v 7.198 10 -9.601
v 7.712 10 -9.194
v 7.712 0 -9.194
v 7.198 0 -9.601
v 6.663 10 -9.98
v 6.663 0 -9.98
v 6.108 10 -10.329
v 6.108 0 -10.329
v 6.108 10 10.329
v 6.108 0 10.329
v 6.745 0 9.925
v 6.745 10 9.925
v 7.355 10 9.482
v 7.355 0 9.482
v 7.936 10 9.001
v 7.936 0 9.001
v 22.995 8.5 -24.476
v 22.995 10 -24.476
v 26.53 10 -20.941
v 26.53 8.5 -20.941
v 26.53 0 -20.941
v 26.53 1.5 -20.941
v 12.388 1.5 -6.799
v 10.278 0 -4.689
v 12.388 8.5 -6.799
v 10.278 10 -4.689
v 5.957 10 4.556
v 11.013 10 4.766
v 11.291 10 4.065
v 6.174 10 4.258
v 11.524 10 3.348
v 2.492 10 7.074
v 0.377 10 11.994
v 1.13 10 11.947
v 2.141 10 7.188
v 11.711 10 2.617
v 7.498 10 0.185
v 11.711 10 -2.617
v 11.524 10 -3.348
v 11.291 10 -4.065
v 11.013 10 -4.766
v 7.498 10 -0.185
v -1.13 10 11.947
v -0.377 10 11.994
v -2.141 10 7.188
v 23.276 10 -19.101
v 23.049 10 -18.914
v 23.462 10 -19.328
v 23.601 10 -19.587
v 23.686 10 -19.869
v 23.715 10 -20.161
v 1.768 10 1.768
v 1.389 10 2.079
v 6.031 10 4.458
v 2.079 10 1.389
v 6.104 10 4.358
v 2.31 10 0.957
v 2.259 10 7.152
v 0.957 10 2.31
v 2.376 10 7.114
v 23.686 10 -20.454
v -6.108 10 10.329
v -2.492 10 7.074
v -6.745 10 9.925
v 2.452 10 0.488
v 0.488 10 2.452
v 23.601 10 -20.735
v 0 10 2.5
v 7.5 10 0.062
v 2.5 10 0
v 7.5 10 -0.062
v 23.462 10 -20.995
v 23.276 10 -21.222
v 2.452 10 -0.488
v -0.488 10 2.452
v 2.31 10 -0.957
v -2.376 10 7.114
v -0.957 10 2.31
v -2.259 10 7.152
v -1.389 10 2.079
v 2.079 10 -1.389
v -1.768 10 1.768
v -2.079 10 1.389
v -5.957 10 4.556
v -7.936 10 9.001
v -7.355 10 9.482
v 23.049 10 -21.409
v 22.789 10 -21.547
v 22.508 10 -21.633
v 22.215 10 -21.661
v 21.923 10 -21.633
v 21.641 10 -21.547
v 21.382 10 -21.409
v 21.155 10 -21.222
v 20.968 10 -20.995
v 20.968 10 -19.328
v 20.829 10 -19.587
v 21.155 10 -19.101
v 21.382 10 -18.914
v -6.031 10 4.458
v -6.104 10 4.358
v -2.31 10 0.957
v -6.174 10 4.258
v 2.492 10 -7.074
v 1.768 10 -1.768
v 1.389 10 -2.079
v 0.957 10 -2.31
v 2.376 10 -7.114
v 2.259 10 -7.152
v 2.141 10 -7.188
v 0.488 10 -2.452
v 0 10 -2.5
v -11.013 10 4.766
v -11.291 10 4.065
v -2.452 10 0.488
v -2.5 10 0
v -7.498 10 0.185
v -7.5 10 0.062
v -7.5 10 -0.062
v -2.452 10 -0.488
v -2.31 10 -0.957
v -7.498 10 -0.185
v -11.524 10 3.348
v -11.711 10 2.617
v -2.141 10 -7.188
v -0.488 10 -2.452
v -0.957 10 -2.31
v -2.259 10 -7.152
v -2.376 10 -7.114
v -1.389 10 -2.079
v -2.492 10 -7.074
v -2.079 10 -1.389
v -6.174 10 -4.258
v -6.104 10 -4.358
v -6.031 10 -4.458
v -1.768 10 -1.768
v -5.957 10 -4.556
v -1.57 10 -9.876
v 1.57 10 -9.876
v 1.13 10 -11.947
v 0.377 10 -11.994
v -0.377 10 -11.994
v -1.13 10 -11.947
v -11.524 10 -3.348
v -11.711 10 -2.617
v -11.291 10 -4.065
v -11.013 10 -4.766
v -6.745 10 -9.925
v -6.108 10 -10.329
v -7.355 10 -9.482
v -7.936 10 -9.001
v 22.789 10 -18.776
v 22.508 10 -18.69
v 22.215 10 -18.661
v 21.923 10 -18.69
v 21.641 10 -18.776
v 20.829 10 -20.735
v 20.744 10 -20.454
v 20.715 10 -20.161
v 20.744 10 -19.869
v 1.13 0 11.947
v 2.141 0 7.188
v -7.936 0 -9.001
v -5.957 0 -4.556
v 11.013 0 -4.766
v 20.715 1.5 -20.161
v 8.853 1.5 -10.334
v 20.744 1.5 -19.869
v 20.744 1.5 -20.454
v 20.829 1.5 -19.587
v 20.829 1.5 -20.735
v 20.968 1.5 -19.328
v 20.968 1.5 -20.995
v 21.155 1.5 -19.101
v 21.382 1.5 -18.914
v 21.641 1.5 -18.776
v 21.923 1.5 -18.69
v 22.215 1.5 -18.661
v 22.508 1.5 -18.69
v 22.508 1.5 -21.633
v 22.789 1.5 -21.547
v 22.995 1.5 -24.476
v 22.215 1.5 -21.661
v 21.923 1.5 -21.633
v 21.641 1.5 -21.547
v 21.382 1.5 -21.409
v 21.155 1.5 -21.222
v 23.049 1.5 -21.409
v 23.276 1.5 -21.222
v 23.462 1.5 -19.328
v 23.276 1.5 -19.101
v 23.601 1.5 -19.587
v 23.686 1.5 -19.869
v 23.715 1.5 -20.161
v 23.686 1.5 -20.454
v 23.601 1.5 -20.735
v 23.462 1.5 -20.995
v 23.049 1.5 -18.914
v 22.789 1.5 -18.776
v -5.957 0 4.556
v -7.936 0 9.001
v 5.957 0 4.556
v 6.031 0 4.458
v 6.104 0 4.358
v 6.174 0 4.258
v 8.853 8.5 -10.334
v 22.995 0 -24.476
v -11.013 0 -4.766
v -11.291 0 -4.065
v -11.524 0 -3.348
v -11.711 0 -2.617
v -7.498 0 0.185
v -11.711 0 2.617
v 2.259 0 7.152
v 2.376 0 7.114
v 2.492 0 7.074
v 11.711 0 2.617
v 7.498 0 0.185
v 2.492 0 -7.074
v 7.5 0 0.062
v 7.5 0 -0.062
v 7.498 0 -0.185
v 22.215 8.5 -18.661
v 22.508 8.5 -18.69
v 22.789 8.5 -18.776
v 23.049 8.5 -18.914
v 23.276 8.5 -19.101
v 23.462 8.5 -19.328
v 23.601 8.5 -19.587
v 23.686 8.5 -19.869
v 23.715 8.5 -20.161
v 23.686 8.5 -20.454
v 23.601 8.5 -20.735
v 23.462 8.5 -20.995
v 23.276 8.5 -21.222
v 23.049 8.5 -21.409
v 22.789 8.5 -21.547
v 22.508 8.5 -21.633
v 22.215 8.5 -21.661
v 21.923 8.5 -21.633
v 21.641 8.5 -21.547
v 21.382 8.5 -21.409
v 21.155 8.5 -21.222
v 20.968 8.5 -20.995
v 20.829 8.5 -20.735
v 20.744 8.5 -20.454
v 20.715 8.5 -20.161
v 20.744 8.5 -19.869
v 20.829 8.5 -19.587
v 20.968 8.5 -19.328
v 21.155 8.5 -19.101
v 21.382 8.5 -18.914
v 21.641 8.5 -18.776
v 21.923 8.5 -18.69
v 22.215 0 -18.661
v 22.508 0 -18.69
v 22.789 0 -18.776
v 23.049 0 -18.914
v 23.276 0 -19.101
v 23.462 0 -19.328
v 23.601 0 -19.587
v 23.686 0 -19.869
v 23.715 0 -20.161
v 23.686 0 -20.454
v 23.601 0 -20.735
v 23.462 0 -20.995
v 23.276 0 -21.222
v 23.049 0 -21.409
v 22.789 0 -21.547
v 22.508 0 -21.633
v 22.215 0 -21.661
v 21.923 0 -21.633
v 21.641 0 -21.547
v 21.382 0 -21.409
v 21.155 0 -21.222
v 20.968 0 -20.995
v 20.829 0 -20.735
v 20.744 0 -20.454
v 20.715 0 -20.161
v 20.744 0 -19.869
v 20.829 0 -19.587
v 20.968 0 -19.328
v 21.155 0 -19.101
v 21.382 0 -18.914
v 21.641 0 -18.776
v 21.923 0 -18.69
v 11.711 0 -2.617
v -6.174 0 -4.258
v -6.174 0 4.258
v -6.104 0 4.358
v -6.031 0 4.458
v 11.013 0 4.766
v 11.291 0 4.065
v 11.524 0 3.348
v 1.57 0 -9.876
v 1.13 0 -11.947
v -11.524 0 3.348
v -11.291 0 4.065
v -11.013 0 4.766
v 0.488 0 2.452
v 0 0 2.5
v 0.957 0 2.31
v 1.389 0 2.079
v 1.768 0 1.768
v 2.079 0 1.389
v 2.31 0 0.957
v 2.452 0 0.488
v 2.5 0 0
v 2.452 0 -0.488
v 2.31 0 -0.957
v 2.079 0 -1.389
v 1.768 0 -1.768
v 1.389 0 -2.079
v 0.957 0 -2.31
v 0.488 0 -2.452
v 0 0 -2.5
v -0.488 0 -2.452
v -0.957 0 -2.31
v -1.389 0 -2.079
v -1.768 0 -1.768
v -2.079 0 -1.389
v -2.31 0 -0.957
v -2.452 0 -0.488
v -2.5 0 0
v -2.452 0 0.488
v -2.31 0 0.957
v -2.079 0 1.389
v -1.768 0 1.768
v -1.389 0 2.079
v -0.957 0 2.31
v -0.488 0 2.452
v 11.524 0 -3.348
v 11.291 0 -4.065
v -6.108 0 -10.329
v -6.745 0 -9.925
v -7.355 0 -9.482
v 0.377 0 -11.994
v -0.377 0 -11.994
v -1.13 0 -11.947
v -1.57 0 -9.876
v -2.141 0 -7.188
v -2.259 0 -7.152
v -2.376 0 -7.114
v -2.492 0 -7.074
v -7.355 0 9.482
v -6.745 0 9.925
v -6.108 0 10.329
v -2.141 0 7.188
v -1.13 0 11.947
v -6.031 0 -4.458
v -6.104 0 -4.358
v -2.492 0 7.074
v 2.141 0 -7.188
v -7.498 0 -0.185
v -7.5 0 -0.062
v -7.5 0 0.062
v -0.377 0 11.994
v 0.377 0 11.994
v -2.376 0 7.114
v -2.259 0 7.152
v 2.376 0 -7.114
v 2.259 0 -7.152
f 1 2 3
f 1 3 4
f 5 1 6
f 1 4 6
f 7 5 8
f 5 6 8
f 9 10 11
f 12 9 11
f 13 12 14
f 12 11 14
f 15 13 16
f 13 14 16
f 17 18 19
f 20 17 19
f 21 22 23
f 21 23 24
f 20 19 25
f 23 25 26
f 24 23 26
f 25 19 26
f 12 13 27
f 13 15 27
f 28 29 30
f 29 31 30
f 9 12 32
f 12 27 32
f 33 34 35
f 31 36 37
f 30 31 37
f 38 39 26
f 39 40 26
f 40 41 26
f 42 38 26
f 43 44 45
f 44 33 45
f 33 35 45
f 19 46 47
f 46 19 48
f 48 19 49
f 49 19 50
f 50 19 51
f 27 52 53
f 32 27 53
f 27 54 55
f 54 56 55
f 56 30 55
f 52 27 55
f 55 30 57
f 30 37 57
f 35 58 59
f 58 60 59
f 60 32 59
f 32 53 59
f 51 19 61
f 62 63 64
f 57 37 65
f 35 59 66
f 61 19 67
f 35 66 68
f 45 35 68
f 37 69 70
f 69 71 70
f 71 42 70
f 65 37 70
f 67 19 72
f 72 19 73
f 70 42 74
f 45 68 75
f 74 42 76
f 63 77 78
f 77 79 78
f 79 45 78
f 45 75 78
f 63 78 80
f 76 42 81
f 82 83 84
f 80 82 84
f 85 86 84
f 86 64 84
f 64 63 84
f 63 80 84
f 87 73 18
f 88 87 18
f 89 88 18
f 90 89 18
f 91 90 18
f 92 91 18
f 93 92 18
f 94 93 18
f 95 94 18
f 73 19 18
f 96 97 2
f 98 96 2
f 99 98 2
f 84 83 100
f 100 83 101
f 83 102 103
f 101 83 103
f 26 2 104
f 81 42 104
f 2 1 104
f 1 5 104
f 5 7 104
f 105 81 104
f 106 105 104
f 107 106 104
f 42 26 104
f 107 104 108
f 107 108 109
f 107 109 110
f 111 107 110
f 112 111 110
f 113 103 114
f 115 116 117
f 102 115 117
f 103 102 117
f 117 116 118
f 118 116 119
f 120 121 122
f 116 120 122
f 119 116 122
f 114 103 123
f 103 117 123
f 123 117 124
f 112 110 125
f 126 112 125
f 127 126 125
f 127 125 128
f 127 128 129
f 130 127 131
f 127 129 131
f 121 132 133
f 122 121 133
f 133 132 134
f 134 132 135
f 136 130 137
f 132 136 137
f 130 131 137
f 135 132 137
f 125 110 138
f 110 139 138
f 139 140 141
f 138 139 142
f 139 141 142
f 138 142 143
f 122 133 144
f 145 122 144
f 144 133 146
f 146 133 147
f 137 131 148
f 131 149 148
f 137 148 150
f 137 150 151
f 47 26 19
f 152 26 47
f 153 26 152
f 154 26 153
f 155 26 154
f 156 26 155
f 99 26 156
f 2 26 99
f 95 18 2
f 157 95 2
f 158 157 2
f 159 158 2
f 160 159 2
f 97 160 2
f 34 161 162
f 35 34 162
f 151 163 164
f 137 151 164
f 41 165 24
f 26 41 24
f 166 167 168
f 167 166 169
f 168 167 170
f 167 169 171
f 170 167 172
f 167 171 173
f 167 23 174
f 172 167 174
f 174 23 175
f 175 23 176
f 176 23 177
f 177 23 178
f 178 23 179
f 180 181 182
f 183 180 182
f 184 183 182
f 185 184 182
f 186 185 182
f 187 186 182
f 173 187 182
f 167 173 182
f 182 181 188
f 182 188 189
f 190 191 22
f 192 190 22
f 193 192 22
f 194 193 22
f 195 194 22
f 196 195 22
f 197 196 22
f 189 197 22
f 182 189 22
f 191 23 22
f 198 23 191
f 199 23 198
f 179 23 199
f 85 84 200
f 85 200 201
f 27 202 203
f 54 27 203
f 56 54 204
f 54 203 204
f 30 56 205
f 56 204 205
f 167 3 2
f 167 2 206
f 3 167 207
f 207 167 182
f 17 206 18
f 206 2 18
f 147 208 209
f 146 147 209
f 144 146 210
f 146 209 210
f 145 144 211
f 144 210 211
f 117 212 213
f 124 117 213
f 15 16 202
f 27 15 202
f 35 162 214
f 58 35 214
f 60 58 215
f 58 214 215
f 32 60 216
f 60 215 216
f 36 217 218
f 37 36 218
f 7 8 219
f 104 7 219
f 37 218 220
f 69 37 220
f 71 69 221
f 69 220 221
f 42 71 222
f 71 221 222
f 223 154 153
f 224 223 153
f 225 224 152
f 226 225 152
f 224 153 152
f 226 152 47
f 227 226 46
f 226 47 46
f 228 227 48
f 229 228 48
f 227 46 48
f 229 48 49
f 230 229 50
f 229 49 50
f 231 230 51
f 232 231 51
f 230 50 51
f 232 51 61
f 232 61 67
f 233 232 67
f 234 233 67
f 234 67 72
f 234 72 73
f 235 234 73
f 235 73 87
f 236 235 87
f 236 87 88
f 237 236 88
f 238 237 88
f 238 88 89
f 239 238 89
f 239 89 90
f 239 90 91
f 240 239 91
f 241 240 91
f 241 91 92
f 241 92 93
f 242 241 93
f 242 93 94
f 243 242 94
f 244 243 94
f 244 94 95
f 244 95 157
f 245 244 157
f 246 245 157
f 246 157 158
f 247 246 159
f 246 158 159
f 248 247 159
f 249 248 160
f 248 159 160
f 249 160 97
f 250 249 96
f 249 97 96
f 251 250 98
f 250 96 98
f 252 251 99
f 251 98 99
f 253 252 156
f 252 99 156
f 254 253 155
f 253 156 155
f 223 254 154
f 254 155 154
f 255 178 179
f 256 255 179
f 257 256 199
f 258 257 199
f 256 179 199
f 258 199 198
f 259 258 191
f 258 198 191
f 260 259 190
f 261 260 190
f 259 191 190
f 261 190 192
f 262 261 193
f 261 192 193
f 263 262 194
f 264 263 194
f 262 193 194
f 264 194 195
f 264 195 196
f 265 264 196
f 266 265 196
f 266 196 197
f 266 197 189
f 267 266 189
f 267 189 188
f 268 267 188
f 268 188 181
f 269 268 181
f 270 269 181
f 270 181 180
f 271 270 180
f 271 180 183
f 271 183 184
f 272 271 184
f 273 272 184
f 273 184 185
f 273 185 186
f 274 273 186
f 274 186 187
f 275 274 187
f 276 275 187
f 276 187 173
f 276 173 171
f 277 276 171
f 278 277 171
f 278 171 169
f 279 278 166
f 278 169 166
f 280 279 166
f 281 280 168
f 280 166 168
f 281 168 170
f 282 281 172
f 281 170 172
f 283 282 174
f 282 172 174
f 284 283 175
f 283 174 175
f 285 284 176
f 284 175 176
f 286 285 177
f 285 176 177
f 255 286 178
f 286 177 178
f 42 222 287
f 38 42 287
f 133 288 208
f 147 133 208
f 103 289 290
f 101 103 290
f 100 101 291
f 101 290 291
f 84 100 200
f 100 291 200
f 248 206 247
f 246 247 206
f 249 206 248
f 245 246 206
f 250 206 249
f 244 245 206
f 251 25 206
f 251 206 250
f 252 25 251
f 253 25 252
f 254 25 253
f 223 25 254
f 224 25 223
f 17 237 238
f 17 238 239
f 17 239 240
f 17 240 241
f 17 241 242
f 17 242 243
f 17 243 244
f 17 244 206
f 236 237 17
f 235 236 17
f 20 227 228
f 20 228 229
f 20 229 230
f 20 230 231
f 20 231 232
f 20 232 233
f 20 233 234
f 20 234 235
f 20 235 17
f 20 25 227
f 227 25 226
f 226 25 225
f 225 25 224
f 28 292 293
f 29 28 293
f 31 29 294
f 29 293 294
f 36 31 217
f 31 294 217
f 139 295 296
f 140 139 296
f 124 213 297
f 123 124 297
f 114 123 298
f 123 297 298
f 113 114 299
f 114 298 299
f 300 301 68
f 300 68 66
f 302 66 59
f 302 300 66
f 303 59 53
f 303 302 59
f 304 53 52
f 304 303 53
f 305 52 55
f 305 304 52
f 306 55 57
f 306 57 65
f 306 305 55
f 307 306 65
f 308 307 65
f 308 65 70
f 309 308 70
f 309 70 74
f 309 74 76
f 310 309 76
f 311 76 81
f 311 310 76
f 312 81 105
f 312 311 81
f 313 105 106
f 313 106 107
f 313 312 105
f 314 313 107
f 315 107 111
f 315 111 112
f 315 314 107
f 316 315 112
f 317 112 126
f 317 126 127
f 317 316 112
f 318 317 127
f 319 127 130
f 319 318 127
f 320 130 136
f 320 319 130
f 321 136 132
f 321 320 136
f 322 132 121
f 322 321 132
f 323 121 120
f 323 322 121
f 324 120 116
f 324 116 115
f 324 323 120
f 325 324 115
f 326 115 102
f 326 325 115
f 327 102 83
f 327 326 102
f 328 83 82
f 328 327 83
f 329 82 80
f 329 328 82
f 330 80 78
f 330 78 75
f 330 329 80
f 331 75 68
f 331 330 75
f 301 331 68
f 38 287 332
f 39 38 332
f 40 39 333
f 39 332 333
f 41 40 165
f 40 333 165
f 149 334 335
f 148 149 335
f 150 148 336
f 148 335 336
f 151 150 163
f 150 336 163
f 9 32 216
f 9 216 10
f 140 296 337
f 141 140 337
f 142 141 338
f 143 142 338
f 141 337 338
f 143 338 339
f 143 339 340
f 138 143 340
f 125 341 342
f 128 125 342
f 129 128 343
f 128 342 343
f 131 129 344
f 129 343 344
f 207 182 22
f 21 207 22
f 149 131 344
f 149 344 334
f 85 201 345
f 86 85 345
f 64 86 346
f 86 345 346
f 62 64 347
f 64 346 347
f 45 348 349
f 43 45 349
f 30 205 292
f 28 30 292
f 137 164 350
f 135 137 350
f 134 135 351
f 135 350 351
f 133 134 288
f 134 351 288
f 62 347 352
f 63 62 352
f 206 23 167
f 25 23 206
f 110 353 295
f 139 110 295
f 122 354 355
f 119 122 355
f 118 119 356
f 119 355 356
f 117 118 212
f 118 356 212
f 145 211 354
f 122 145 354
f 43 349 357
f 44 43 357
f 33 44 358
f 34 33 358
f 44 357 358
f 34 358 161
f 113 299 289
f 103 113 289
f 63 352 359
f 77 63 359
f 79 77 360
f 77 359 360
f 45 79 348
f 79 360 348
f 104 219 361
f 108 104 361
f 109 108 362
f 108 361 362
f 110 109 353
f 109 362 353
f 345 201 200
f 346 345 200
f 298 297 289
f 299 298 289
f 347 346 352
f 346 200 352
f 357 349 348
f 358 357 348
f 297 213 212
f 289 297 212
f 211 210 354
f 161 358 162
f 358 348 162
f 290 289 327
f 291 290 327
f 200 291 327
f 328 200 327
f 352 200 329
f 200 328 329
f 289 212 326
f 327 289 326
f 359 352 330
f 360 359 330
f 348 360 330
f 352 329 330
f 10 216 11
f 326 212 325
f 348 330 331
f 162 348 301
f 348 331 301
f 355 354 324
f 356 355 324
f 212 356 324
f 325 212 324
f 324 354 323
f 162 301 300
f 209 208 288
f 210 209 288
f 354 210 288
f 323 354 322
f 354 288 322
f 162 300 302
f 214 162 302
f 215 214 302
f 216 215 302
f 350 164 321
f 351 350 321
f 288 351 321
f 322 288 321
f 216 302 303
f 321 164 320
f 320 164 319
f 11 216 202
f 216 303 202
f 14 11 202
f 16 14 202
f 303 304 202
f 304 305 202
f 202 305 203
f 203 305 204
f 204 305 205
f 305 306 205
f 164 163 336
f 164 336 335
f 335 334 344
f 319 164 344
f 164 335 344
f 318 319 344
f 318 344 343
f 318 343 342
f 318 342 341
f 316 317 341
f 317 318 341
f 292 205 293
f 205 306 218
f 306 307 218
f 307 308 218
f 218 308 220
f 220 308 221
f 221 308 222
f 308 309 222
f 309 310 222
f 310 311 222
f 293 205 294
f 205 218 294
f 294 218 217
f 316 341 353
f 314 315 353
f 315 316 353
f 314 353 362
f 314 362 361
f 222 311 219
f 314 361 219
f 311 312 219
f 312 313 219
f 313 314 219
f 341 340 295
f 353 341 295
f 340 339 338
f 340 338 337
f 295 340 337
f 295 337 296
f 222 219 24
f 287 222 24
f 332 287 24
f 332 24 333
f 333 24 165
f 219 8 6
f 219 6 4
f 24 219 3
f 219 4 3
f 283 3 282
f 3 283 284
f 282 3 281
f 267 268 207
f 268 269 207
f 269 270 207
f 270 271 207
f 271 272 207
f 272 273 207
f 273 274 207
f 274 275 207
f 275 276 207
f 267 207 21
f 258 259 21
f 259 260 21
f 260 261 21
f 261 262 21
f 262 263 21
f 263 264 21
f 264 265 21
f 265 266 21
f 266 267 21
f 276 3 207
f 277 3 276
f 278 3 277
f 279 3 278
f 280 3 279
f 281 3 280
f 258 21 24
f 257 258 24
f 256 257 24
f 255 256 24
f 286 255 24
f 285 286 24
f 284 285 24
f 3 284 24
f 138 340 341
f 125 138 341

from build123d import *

# Parameters (mm, degrees)
SKETCH1_R           = 2.5
BOSS_EXTRUDE1_DEPTH = 10
BOSS_EXTRUDE2_DEPTH = 10
SKETCH3_R           = 1.5
CUT_EXTRUDE1_DEPTH  = 55
SKETCH4_W           = 40
SKETCH4_H           = 7
CUT_EXTRUDE2_DEPTH  = 10


with BuildPart() as part:
    # Sketch1 → Boss-Extrude1 (new body)
    # profile 1 of 2: a face of its own
    with BuildSketch(Plane(origin=(0, 0, 0), x_dir=(1, 0, 0), z_dir=(0, 1, 0))):
        with BuildLine():
            Line((1.57, 9.875986027), (-1.57, 9.875986027))
            Line((-1.57, 9.875986027), (-2.141392001, 7.187798015))
            ThreePointArc((-2.141392001, 7.187798015), (-2.317627458, 7.132923872), (-2.492459149, 7.073729383))
            Line((-2.492459149, 7.073729383), (-6.108014237, 10.329189807))
            ThreePointArc((-6.108014237, 10.329189807), (-7.053423028, 9.708203932), (-7.936163073, 9.000961931))
            Line((-7.936163073, 9.000961931), (-5.95730419, 4.556372108))
            ThreePointArc((-5.95730419, 4.556372108), (-6.067627458, 4.408389392), (-6.17427562, 4.257736555))
            Line((-6.17427562, 4.257736555), (-11.012832757, 4.766289403))
            ThreePointArc((-11.012832757, 4.766289403), (-11.412678196, 3.708203932), (-11.711123476, 2.617171553))
            Line((-11.711123476, 2.617171553), (-7.497728659, 0.184566922))
            ThreePointArc((-7.497728659, 0.184566922), (-7.5, 0), (-7.497728659, -0.184566922))
            Line((-7.497728659, -0.184566922), (-11.711123476, -2.617171553))
            ThreePointArc((-11.711123476, -2.617171553), (-11.412678196, -3.708203932), (-11.012832757, -4.766289403))
            Line((-11.012832757, -4.766289403), (-6.17427562, -4.257736555))
            ThreePointArc((-6.17427562, -4.257736555), (-6.067627458, -4.408389392), (-5.95730419, -4.556372108))
            Line((-5.95730419, -4.556372108), (-7.936163073, -9.000961931))
            ThreePointArc((-7.936163073, -9.000961931), (-7.053423028, -9.708203932), (-6.108014237, -10.329189807))
            Line((-6.108014237, -10.329189807), (-2.492459149, -7.073729383))
            ThreePointArc((-2.492459149, -7.073729383), (-2.317627458, -7.132923872), (-2.141392001, -7.187798015))
            Line((-2.141392001, -7.187798015), (-1.129858117, -11.946690782))
            ThreePointArc((-1.129858117, -11.946690782), (0, -12), (1.129858117, -11.946690782))
            Line((1.129858117, -11.946690782), (2.141392001, -7.187798015))
            ThreePointArc((2.141392001, -7.187798015), (2.317627458, -7.132923872), (2.492459149, -7.073729383))
            Line((2.492459149, -7.073729383), (6.108014237, -10.329189807))
            ThreePointArc((6.108014237, -10.329189807), (7.053423028, -9.708203932), (7.936163073, -9.000961931))
            Line((7.936163073, -9.000961931), (5.95730419, -4.556372108))
            ThreePointArc((5.95730419, -4.556372108), (6.067627458, -4.408389392), (6.17427562, -4.257736555))
            Line((6.17427562, -4.257736555), (11.012832757, -4.766289403))
            ThreePointArc((11.012832757, -4.766289403), (11.412678196, -3.708203932), (11.711123476, -2.617171553))
            Line((11.711123476, -2.617171553), (7.497728659, -0.184566922))
            ThreePointArc((7.497728659, -0.184566922), (7.5, 0), (7.497728659, 0.184566922))
            Line((7.497728659, 0.184566922), (11.711123476, 2.617171553))
            ThreePointArc((11.711123476, 2.617171553), (11.412678196, 3.708203932), (11.012832757, 4.766289403))
            Line((11.012832757, 4.766289403), (6.17427562, 4.257736555))
            ThreePointArc((6.17427562, 4.257736555), (6.067627458, 4.408389392), (5.95730419, 4.556372108))
            Line((5.95730419, 4.556372108), (7.936163073, 9.000961931))
            ThreePointArc((7.936163073, 9.000961931), (7.053423028, 9.708203932), (6.108014237, 10.329189807))
            Line((6.108014237, 10.329189807), (2.492459149, 7.073729383))
            ThreePointArc((2.492459149, 7.073729383), (2.317627458, 7.132923872), (2.141392001, 7.187798015))
            Line((2.141392001, 7.187798015), (1.57, 9.875986027))
        make_face()
        with Locations(Location((0, 0, 0), (0, 0, 270))):
            Circle(SKETCH1_R, mode=Mode.SUBTRACT)
    # profile 2 of 2: a face of its own
    with BuildSketch(Plane(origin=(0, 0, 0), x_dir=(1, 0, 0), z_dir=(0, 1, 0))):
        with BuildLine():
            Line((-1.129858117, 11.946690782), (-1.57, 9.875986027))
            Line((-1.57, 9.875986027), (1.57, 9.875986027))
            Line((1.57, 9.875986027), (1.129858117, 11.946690782))
            ThreePointArc((1.129858117, 11.946690782), (0, 12), (-1.129858117, 11.946690782))
        make_face()
    extrude(amount=BOSS_EXTRUDE1_DEPTH)

    # Sketch2 → Boss-Extrude2 (add)
    with BuildSketch(Plane(origin=(0, 10, 0), x_dir=(1, 0, 0), z_dir=(0, 1, 0))):
        Polygon((1.781492434, 3.263264717), (22.99469587, 24.476468153), (26.530229776, 20.940934247), (5.31702634, -0.272269189), align=None)
    extrude(amount=-BOSS_EXTRUDE2_DEPTH)

    # Sketch3 → Cut-Extrude1 (cut)
    with BuildSketch(Plane(origin=(0, 10, 0), x_dir=(1, 0, 0), z_dir=(0, 1, 0))):
        with Locations(Location((22.215215239, 20.161453616, 0), (0, 0, 270))):
            Circle(SKETCH3_R)
    extrude(amount=-CUT_EXTRUDE1_DEPTH, mode=Mode.SUBTRACT)

    # Sketch4 → Cut-Extrude2 (cut)
    with BuildSketch(Plane(origin=(2.794647764, 0, 2.794647764), x_dir=(0.7071067811865461, 0, -0.707106781186549), z_dir=(0.707106781186549, 0, 0.7071067811865461))):
        with Locations((33.567181991, 5)):
            Rectangle(SKETCH4_W, SKETCH4_H)
    extrude(amount=-CUT_EXTRUDE2_DEPTH, mode=Mode.SUBTRACT)


solid = part.part
